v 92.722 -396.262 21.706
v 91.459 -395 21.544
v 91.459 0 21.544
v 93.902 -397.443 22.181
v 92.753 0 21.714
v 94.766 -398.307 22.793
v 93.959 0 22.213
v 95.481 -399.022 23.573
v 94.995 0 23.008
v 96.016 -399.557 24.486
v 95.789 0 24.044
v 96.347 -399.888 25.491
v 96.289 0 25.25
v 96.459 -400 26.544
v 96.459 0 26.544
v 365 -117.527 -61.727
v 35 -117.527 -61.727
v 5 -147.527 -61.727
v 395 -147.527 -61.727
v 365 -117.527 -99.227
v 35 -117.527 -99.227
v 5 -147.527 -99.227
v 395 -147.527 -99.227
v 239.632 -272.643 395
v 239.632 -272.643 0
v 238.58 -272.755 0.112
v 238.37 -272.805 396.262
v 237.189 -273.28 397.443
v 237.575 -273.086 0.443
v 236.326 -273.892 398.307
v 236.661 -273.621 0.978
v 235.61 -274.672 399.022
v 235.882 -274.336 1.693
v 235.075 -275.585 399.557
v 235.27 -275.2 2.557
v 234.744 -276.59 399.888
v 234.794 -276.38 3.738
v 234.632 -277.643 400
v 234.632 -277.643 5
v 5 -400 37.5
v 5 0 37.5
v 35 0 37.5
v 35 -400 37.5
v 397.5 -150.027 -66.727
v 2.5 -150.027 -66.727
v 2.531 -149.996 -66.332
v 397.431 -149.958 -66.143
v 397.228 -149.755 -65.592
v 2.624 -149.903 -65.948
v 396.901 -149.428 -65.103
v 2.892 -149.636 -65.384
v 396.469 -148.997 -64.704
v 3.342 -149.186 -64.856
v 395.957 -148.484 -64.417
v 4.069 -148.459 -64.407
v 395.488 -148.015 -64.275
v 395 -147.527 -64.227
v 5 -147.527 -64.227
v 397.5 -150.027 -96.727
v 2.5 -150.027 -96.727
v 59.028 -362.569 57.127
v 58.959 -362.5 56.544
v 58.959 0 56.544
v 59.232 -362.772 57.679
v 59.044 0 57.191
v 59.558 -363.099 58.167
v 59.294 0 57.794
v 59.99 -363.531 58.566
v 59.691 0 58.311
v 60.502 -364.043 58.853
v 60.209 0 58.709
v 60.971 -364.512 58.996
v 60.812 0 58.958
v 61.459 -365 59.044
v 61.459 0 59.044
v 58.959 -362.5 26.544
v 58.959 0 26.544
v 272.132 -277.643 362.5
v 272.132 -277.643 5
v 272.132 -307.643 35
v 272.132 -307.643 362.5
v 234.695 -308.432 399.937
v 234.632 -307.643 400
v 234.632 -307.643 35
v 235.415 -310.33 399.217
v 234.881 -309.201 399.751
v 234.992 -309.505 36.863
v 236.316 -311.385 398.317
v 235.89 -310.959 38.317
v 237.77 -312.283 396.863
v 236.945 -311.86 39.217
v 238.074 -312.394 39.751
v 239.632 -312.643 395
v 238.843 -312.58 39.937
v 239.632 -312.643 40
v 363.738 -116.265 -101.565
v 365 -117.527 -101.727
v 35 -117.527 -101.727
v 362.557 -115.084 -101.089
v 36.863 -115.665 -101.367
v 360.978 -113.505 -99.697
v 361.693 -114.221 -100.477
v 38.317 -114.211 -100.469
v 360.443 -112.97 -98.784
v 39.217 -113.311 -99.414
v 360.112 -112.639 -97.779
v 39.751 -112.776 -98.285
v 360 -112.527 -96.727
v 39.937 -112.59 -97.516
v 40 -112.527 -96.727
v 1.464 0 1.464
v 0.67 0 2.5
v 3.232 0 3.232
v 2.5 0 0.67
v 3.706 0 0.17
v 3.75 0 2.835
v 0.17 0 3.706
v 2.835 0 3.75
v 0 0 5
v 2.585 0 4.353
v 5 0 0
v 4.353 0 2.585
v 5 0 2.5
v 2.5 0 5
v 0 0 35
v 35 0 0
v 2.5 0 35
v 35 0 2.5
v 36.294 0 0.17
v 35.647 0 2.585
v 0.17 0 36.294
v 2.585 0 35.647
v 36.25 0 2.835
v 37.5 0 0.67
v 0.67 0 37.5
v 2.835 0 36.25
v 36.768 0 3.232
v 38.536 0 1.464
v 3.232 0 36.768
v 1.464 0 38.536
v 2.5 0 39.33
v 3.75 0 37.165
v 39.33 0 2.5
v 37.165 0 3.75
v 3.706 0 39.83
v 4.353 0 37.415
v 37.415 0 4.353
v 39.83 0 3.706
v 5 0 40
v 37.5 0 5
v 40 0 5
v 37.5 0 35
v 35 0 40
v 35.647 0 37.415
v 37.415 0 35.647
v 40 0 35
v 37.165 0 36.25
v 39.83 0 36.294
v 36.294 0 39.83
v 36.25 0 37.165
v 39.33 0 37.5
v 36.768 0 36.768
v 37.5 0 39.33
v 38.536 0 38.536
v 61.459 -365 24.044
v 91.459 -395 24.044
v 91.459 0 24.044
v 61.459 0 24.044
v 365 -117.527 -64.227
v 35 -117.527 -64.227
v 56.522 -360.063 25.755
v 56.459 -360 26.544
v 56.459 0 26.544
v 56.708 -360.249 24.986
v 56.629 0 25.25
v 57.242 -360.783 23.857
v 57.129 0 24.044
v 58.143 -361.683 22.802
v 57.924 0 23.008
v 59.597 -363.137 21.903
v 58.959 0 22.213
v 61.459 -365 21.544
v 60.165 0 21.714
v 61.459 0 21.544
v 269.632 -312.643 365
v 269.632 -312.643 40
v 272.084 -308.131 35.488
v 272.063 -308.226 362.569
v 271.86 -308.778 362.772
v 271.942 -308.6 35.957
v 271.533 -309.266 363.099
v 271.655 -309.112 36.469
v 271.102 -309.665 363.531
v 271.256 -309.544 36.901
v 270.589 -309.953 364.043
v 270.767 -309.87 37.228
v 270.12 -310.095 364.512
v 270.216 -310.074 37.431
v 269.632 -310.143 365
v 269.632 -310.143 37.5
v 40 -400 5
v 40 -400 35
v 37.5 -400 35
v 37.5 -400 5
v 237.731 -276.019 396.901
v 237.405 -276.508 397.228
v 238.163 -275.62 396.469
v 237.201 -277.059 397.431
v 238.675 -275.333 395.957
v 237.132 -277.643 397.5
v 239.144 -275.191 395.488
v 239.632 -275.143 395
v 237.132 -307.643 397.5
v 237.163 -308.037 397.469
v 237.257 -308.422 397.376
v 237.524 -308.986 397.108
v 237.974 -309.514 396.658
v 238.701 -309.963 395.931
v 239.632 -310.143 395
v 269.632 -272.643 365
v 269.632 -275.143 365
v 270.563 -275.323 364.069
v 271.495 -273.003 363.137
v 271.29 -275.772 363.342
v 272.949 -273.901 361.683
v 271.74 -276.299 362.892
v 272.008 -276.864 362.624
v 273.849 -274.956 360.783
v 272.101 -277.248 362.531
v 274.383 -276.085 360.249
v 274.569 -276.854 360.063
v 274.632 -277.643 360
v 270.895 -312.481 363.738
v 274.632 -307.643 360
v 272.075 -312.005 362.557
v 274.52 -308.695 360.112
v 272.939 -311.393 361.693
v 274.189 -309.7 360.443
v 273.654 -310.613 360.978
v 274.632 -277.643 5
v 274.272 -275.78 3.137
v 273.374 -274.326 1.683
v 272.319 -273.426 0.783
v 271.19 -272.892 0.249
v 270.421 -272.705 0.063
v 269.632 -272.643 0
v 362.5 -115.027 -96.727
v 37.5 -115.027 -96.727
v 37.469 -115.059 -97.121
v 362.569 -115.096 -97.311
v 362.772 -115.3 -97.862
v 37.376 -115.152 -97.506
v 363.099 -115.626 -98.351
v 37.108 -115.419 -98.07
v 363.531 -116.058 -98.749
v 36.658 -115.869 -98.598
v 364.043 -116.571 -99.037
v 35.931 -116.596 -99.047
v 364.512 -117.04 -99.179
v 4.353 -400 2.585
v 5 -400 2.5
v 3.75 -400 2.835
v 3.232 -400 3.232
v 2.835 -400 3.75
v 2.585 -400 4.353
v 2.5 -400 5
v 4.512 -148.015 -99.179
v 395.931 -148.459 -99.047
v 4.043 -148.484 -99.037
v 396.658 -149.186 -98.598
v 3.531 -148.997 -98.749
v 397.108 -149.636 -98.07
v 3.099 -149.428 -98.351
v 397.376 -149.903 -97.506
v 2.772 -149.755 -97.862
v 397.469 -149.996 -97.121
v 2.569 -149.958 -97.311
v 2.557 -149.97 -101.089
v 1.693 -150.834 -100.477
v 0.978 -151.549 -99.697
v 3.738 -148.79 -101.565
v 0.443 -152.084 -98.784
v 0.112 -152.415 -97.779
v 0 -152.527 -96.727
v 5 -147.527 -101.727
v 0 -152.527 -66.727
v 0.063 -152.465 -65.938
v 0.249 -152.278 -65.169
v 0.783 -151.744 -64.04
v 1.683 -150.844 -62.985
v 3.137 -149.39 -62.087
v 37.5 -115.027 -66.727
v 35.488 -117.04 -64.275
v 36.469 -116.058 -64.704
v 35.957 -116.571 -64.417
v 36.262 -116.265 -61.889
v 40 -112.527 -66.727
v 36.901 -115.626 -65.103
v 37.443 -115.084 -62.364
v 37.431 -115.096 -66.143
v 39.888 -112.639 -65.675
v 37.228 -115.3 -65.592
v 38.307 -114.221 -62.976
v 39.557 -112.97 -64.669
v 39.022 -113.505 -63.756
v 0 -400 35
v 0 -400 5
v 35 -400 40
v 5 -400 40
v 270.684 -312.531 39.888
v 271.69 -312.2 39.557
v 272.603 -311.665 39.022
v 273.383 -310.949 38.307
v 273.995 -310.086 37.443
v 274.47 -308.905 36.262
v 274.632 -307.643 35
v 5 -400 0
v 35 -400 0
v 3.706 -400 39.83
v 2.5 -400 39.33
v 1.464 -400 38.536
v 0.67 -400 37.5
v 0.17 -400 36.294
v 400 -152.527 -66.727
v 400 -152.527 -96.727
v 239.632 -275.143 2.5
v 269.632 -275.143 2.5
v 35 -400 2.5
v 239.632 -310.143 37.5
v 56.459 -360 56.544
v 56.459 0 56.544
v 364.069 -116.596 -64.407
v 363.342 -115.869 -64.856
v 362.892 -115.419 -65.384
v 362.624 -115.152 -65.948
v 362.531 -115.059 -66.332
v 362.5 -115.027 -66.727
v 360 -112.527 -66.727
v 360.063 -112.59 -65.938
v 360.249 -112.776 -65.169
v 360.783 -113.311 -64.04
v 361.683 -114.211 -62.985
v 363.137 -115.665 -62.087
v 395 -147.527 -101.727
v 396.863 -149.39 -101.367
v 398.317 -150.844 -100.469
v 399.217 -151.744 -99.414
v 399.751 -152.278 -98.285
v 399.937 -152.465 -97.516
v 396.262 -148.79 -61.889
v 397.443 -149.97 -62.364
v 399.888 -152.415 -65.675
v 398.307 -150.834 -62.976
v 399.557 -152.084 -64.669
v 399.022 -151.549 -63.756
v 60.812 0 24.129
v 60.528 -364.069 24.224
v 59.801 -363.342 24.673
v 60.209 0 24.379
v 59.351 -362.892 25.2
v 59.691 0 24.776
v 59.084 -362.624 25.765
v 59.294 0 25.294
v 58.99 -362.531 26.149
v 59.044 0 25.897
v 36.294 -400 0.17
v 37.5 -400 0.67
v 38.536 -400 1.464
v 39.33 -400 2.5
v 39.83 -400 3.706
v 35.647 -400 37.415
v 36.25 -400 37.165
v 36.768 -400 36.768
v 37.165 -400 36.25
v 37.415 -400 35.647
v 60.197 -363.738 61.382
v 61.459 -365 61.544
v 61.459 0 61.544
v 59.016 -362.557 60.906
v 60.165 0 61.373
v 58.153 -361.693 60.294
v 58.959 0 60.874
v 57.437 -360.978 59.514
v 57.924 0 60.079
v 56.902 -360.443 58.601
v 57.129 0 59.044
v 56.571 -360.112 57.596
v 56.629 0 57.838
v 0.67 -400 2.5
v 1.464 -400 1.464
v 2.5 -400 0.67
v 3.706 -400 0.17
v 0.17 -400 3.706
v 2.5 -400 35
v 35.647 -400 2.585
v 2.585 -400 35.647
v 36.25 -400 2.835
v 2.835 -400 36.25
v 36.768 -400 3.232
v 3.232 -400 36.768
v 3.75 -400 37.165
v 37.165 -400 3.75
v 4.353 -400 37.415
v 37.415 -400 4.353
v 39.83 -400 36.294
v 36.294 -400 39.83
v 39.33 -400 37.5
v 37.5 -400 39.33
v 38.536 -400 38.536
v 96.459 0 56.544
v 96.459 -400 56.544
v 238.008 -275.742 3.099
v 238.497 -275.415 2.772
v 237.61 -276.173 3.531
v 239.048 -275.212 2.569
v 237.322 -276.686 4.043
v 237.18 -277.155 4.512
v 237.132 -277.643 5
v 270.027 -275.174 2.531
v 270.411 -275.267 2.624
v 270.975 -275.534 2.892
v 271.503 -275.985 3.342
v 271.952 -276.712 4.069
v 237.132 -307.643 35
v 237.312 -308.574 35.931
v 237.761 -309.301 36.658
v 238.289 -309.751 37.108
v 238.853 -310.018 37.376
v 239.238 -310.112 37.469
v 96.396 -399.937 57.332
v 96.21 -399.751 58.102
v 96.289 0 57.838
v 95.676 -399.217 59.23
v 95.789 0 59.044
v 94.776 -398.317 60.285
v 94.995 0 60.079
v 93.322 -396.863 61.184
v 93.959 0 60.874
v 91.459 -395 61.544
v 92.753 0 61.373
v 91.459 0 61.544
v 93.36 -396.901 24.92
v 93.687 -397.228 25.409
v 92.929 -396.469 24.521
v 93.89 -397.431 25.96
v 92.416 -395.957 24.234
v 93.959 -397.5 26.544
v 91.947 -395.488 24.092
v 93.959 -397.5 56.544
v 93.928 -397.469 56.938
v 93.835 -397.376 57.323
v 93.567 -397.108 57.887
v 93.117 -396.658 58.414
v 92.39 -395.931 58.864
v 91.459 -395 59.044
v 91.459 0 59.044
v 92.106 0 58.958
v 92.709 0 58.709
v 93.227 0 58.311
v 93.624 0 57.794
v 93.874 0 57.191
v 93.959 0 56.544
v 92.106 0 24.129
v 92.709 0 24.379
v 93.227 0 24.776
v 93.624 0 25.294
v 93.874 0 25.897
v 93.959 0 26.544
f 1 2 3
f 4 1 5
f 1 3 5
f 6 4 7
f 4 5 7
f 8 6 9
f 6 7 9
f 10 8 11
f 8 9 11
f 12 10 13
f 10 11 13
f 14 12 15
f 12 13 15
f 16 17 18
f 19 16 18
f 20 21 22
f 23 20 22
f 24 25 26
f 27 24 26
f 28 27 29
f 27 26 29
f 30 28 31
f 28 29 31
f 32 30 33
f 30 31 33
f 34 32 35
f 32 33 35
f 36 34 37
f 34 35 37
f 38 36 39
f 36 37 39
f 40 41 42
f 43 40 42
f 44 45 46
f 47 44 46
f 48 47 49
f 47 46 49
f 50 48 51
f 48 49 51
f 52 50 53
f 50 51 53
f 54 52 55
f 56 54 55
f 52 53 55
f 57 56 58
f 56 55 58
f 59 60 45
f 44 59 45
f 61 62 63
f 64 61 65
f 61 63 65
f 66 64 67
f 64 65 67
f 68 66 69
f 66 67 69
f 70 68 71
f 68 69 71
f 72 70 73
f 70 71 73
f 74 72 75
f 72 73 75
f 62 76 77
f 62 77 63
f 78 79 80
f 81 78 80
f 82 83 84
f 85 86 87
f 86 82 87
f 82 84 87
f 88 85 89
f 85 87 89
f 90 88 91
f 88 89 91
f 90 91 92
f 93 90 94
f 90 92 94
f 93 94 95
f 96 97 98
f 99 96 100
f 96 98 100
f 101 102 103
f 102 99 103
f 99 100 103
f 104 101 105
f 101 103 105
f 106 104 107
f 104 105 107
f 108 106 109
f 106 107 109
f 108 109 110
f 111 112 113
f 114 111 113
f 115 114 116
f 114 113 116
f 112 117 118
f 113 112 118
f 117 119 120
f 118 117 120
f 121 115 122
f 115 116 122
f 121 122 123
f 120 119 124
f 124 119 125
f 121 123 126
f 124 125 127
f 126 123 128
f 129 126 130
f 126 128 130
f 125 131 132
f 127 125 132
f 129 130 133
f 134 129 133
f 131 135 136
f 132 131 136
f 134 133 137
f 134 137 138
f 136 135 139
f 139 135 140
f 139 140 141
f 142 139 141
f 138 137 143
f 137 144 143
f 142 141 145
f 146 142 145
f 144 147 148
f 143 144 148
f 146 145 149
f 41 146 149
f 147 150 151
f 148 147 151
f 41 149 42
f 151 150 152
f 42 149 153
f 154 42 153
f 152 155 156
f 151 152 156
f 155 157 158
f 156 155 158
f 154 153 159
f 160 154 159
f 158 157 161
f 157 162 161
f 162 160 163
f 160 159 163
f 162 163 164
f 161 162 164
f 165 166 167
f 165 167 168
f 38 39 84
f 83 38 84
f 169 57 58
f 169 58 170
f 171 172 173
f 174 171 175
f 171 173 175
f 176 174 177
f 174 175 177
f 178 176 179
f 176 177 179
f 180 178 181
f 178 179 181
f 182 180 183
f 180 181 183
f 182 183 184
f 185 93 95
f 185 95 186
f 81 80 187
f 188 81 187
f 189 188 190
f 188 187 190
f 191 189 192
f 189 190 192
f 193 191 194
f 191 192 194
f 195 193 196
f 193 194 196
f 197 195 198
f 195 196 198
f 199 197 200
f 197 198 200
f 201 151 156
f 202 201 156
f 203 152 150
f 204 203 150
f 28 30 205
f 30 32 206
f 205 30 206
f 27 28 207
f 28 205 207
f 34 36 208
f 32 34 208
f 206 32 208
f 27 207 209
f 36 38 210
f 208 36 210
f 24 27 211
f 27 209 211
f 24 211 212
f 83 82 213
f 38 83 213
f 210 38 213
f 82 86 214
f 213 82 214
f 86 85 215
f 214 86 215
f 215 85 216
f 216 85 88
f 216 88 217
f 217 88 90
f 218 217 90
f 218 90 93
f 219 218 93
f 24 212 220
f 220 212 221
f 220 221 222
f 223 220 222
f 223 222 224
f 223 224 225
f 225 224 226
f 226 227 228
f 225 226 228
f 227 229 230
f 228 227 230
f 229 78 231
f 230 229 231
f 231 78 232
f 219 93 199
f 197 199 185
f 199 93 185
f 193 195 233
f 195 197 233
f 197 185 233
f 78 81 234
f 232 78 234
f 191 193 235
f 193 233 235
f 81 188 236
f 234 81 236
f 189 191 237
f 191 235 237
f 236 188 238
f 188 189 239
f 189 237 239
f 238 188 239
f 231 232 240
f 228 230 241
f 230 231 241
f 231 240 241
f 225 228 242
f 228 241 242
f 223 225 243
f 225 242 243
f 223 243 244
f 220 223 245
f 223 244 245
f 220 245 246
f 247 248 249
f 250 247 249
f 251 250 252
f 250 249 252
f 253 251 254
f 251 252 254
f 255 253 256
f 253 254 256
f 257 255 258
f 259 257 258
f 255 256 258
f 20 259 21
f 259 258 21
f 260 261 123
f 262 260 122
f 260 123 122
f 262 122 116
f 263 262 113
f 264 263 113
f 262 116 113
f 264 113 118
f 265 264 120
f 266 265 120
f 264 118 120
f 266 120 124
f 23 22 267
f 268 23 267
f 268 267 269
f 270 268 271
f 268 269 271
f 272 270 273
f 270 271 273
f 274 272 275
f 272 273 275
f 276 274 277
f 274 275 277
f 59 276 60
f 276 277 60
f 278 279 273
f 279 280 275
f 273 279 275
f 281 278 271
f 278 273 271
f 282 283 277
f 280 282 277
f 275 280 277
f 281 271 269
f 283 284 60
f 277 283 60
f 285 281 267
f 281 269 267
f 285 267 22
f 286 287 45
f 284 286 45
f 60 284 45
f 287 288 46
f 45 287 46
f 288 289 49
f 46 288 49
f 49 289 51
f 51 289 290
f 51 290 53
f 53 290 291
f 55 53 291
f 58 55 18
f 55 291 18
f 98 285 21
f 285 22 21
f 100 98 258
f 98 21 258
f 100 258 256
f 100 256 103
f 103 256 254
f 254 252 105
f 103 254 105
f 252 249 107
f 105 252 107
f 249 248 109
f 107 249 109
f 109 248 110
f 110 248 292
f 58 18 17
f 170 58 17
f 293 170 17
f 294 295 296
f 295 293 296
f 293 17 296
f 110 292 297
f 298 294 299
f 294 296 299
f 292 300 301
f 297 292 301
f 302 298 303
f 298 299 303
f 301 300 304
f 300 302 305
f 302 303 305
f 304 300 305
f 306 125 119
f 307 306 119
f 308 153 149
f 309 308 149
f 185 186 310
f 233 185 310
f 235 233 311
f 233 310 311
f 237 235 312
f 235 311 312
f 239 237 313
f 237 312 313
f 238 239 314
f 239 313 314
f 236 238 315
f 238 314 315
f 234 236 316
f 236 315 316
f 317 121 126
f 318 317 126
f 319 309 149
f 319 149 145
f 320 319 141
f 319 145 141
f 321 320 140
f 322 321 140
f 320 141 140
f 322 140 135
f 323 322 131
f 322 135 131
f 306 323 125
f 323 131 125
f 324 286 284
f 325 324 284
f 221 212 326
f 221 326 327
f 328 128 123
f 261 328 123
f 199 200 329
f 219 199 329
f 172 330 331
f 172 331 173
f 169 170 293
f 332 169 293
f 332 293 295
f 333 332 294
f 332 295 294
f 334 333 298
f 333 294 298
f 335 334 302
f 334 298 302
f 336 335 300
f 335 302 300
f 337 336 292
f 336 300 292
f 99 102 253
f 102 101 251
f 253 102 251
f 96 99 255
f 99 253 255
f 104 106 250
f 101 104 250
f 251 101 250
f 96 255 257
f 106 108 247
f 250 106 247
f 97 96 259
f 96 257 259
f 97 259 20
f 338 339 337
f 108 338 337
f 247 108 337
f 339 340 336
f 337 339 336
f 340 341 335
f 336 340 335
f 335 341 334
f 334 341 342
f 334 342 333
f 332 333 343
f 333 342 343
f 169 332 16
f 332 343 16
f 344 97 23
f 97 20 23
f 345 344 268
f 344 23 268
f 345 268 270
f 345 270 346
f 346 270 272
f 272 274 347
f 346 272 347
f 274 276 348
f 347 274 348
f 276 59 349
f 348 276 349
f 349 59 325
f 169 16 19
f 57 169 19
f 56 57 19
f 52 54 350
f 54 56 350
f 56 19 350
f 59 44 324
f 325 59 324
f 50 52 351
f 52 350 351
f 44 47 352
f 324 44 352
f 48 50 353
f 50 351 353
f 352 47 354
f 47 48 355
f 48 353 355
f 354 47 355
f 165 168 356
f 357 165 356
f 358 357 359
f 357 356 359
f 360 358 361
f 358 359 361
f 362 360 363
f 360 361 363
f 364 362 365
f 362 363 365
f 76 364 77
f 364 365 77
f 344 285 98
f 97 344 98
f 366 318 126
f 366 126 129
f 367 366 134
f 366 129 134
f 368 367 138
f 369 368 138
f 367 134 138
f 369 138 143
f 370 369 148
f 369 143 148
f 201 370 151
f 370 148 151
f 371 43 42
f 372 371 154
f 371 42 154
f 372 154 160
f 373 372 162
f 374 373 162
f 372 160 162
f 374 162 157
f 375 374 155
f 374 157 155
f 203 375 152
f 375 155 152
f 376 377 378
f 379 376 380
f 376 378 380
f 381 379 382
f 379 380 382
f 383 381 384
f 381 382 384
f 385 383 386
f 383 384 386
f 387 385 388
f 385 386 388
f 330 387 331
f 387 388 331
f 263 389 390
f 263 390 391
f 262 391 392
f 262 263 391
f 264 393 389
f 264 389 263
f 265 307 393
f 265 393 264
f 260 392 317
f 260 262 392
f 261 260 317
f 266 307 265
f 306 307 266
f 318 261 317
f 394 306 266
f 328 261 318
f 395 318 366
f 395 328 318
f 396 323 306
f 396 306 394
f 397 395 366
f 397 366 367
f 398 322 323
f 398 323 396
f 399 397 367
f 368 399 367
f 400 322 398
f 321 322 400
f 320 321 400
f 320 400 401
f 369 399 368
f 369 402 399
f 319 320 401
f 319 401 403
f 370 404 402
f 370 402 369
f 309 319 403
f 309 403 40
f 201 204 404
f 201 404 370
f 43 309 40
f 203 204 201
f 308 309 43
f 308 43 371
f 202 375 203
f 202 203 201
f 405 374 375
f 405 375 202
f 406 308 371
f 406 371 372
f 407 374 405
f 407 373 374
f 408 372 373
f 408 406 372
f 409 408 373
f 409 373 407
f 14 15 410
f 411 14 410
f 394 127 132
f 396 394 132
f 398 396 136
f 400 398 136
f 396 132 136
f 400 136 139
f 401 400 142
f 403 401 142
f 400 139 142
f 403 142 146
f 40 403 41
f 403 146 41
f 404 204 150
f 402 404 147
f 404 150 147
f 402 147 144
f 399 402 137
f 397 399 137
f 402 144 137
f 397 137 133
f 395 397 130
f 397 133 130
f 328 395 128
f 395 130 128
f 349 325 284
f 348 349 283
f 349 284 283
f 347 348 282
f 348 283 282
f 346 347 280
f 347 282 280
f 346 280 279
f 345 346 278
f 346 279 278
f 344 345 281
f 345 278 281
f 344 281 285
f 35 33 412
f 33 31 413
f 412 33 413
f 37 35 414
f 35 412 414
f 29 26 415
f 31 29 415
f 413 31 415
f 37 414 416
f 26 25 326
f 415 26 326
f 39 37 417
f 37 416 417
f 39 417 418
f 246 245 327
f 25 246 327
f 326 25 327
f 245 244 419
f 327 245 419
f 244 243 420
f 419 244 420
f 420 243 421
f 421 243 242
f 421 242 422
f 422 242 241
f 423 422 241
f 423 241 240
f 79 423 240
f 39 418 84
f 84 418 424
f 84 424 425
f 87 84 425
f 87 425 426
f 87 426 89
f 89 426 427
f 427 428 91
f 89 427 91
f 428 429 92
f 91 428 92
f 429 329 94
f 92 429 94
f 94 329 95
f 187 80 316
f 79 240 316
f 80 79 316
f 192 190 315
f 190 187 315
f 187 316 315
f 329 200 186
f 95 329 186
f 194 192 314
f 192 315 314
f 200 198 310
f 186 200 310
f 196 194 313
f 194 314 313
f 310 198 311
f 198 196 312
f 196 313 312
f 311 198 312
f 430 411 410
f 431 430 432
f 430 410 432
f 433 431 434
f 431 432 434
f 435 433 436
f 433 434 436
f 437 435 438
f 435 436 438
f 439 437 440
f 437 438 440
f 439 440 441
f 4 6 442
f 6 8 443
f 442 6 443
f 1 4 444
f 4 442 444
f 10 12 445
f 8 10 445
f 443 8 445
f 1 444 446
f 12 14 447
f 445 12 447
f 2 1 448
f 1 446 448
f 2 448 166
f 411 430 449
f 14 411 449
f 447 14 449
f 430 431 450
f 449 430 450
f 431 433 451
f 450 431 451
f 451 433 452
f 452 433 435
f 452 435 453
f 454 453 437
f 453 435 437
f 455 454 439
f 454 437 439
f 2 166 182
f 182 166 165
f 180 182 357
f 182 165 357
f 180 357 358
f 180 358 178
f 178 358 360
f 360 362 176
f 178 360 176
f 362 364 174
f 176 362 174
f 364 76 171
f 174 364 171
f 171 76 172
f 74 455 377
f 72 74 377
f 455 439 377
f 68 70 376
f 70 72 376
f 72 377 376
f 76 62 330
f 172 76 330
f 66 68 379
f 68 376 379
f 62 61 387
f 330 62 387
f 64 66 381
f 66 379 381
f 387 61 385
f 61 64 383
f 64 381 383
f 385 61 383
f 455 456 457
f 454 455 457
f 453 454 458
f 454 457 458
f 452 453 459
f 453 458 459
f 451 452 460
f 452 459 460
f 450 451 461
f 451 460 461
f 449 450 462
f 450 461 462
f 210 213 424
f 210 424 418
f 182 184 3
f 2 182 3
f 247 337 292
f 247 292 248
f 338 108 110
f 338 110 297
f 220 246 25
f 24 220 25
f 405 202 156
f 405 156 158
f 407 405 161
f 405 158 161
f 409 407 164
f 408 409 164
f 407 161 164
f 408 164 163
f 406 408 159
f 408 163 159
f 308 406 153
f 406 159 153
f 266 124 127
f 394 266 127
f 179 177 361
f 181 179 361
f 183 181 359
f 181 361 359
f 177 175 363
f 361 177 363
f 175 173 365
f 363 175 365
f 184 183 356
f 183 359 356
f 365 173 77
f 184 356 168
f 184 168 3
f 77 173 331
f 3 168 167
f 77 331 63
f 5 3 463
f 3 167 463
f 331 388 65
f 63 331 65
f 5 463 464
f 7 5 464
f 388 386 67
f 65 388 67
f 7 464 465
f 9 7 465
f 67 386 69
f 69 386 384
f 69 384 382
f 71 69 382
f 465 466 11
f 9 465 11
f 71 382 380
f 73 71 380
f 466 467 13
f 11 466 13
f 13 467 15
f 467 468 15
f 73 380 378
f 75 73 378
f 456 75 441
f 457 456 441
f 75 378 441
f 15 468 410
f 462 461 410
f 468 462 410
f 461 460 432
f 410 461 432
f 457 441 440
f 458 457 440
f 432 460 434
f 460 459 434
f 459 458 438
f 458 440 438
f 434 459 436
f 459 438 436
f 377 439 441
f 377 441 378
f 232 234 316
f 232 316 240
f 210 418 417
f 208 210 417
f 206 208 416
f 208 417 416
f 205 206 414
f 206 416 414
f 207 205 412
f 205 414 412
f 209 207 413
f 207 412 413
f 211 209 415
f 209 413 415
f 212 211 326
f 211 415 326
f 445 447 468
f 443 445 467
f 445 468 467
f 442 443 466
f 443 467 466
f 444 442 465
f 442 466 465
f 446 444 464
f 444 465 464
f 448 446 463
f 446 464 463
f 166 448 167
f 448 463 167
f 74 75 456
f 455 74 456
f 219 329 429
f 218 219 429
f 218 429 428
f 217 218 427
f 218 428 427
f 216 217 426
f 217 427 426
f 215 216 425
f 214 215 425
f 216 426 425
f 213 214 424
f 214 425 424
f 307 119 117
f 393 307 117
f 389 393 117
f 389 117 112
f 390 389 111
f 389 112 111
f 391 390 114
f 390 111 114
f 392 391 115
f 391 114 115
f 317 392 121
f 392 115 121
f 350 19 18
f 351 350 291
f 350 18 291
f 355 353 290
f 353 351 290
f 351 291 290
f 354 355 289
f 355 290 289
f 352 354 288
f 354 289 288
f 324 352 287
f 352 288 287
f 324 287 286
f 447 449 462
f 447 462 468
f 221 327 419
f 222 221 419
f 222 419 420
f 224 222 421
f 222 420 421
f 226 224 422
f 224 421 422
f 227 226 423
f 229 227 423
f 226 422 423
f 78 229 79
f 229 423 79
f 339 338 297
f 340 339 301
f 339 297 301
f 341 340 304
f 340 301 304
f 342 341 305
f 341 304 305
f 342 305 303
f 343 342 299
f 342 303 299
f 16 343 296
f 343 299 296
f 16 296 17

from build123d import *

# Parameters (mm, degrees)
F1_DEPTH  = 400
F3_DEPTH  = 400
F5_DEPTH  = 40
F7_DEPTH  = 40
F9_DEPTH  = 40
F11_DEPTH = 400
F13_DEPTH = 163.2715079019
F15_DEPTH = 400
F17_DEPTH = 274.6330855618
F19_DEPTH = 312.6438318024
F20_DEPTH = 400


with BuildPart() as f1:
    # F0 (on Front) → F1 (new body)
    with BuildSketch(Plane.XZ):
        with BuildLine():
            ThreePointArc((0, 5), (1.4644660941, 1.4644660941), (5, 0))
            Line((5, 0), (35, 0))
            ThreePointArc((35, 0), (38.5355339059, 1.4644660941), (40, 5))
            Line((40, 5), (40, 35))
            ThreePointArc((40, 35), (38.5355339059, 38.5355339059), (35, 40))
            Line((35, 40), (5, 40))
            ThreePointArc((5, 40), (1.4644660941, 38.5355339059), (0, 35))
            Line((0, 35), (0, 5))
        make_face()
        with BuildLine():
            Line((35, 2.5), (5, 2.5))
            ThreePointArc((5, 2.5), (3.232233047, 3.232233047), (2.5, 5))
            Line((2.5, 5), (2.5, 35))
            ThreePointArc((2.5, 35), (3.232233047, 36.767766953), (5, 37.5))
            Line((5, 37.5), (35, 37.5))
            ThreePointArc((35, 37.5), (36.767766953, 36.767766953), (37.5, 35))
            Line((37.5, 35), (37.5, 5))
            ThreePointArc((37.5, 5), (36.767766953, 3.232233047), (35, 2.5))
        make_face(mode=Mode.SUBTRACT)
    extrude(amount=F1_DEPTH)

    # F4 (on face) → F5 (cut)
    with BuildSketch(Plane.XY.offset(40)):
        Polygon((40, -400), (40, -360), (0, -400), align=None)
    extrude(amount=-F5_DEPTH, mode=Mode.SUBTRACT)

    # F6 (on face) → F7 (cut)
    with BuildSketch(Plane.YZ.offset(40)):
        Polygon((0, 40), (-40, 40), (0, 0), align=None)
    extrude(amount=-F7_DEPTH, mode=Mode.SUBTRACT)

    # F0 (on Front) → F20 (join)
    with BuildSketch(Plane.XZ):
        with BuildLine():
            ThreePointArc((0, 5), (1.4644660941, 1.4644660941), (5, 0))
            Line((5, 0), (35, 0))
            ThreePointArc((35, 0), (38.5355339059, 1.4644660941), (40, 5))
            Line((40, 5), (40, 35))
            ThreePointArc((40, 35), (38.5355339059, 38.5355339059), (35, 40))
            Line((35, 40), (5, 40))
            ThreePointArc((5, 40), (1.4644660941, 38.5355339059), (0, 35))
            Line((0, 35), (0, 5))
        make_face()
        with BuildLine():
            Line((35, 2.5), (5, 2.5))
            ThreePointArc((5, 2.5), (3.232233047, 3.232233047), (2.5, 5))
            Line((2.5, 5), (2.5, 35))
            ThreePointArc((2.5, 35), (3.232233047, 36.767766953), (5, 37.5))
            Line((5, 37.5), (35, 37.5))
            ThreePointArc((35, 37.5), (36.767766953, 36.767766953), (37.5, 35))
            Line((37.5, 35), (37.5, 5))
            ThreePointArc((37.5, 5), (36.767766953, 3.232233047), (35, 2.5))
        make_face(mode=Mode.SUBTRACT)
    extrude(amount=F20_DEPTH)


with BuildPart() as f3:
    # F2 (on Right) → F3 (new body)
    with BuildSketch(Plane.YZ):
        with BuildLine():
            ThreePointArc((-152.5273066759, -96.7268937826), (-151.0628405818, -100.2624276885), (-147.5273066759, -101.7268937826))
            Line((-147.5273066759, -101.7268937826), (-117.5273066759, -101.7268937826))
            ThreePointArc((-117.5273066759, -101.7268937826), (-113.99177277, -100.2624276885), (-112.5273066759, -96.7268937826))
            Line((-112.5273066759, -96.7268937826), (-112.5273066759, -66.7268937826))
            ThreePointArc((-112.5273066759, -66.7268937826), (-113.99177277, -63.1913598767), (-117.5273066759, -61.7268937826))
            Line((-117.5273066759, -61.7268937826), (-147.5273066759, -61.7268937826))
            ThreePointArc((-147.5273066759, -61.7268937826), (-151.0628405818, -63.1913598767), (-152.5273066759, -66.7268937826))
            Line((-152.5273066759, -66.7268937826), (-152.5273066759, -96.7268937826))
        make_face()
        with BuildLine():
            Line((-117.5273066759, -99.2268937826), (-147.5273066759, -99.2268937826))
            ThreePointArc((-147.5273066759, -99.2268937826), (-149.2950736289, -98.4946607356), (-150.0273066759, -96.7268937826))
            Line((-150.0273066759, -96.7268937826), (-150.0273066759, -66.7268937826))
            ThreePointArc((-150.0273066759, -66.7268937826), (-149.2950736289, -64.9591268296), (-147.5273066759, -64.2268937826))
            Line((-147.5273066759, -64.2268937826), (-117.5273066759, -64.2268937826))
            ThreePointArc((-117.5273066759, -64.2268937826), (-115.7595397229, -64.9591268296), (-115.0273066759, -66.7268937826))
            Line((-115.0273066759, -66.7268937826), (-115.0273066759, -96.7268937826))
            ThreePointArc((-115.0273066759, -96.7268937826), (-115.7595397229, -98.4946607356), (-117.5273066759, -99.2268937826))
        make_face(mode=Mode.SUBTRACT)
    extrude(amount=F3_DEPTH)

    # F8 (on face) → F9 (cut)
    with BuildSketch(Plane.XY.offset(-61.7268937826)):
        Polygon((40, -112.5273066759), (0, -112.5273066759), (0, -152.5273066759), align=None)
        Polygon((400, -112.5273066759), (360, -112.5273066759), (400, -152.5273066759), align=None)
    extrude(amount=-F9_DEPTH, mode=Mode.SUBTRACT)


with BuildPart() as f11:
    # F10 (on Front) → F11 (new body)
    with BuildSketch(Plane.XZ):
        with BuildLine():
            ThreePointArc((56.4591023326, 26.5436141193), (57.9235684267, 23.0080802134), (61.4591023326, 21.5436141193))
            Line((61.4591023326, 21.5436141193), (91.4591023326, 21.5436141193))
            ThreePointArc((91.4591023326, 21.5436141193), (94.9946362385, 23.0080802134), (96.4591023326, 26.5436141193))
            Line((96.4591023326, 26.5436141193), (96.4591023326, 56.5436141193))
            ThreePointArc((96.4591023326, 56.5436141193), (94.9946362385, 60.0791480252), (91.4591023326, 61.5436141193))
            Line((91.4591023326, 61.5436141193), (61.4591023326, 61.5436141193))
            ThreePointArc((61.4591023326, 61.5436141193), (57.9235684267, 60.0791480252), (56.4591023326, 56.5436141193))
            Line((56.4591023326, 56.5436141193), (56.4591023326, 26.5436141193))
        make_face()
        with BuildLine():
            Line((91.4591023326, 24.0436141193), (61.4591023326, 24.0436141193))
            ThreePointArc((61.4591023326, 24.0436141193), (59.6913353796, 24.7758471663), (58.9591023326, 26.5436141193))
            Line((58.9591023326, 26.5436141193), (58.9591023326, 56.5436141193))
            ThreePointArc((58.9591023326, 56.5436141193), (59.6913353796, 58.3113810723), (61.4591023326, 59.0436141193))
            Line((61.4591023326, 59.0436141193), (91.4591023326, 59.0436141193))
            ThreePointArc((91.4591023326, 59.0436141193), (93.2268692856, 58.3113810723), (93.9591023326, 56.5436141193))
            Line((93.9591023326, 56.5436141193), (93.9591023326, 26.5436141193))
            ThreePointArc((93.9591023326, 26.5436141193), (93.2268692856, 24.7758471663), (91.4591023326, 24.0436141193))
        make_face(mode=Mode.SUBTRACT)
    extrude(amount=F11_DEPTH)

    # F12 (on face) → F13 (cut, through all)
    with BuildSketch(Plane.XY.offset(61.5436141193)):
        Polygon((56.4591023326, -360), (56.4591023326, -400), (96.4591023326, -400), align=None)
    extrude(amount=-F13_DEPTH, mode=Mode.SUBTRACT)


with BuildPart() as f15:
    # F14 (on Top) → F15 (new body)
    with BuildSketch(Plane.XY):
        with BuildLine():
            ThreePointArc((234.6320855618, -307.6428318024), (236.0965516558, -311.1783657083), (239.6320855618, -312.6428318024))
            Line((239.6320855618, -312.6428318024), (269.6320855618, -312.6428318024))
            ThreePointArc((269.6320855618, -312.6428318024), (273.1676194677, -311.1783657083), (274.6320855618, -307.6428318024))
            Line((274.6320855618, -307.6428318024), (274.6320855618, -277.6428318024))
            ThreePointArc((274.6320855618, -277.6428318024), (273.1676194677, -274.1072978964), (269.6320855618, -272.6428318024))
            Line((269.6320855618, -272.6428318024), (239.6320855618, -272.6428318024))
            ThreePointArc((239.6320855618, -272.6428318024), (236.0965516558, -274.1072978964), (234.6320855618, -277.6428318024))
            Line((234.6320855618, -277.6428318024), (234.6320855618, -307.6428318024))
        make_face()
        with BuildLine():
            Line((269.6320855618, -310.1428318024), (239.6320855618, -310.1428318024))
            ThreePointArc((239.6320855618, -310.1428318024), (237.8643186088, -309.4105987553), (237.1320855618, -307.6428318024))
            Line((237.1320855618, -307.6428318024), (237.1320855618, -277.6428318024))
            ThreePointArc((237.1320855618, -277.6428318024), (237.8643186088, -275.8750648494), (239.6320855618, -275.1428318024))
            Line((239.6320855618, -275.1428318024), (269.6320855618, -275.1428318024))
            ThreePointArc((269.6320855618, -275.1428318024), (271.3998525147, -275.8750648494), (272.1320855618, -277.6428318024))
            Line((272.1320855618, -277.6428318024), (272.1320855618, -307.6428318024))
            ThreePointArc((272.1320855618, -307.6428318024), (271.3998525147, -309.4105987553), (269.6320855618, -310.1428318024))
        make_face(mode=Mode.SUBTRACT)
    extrude(amount=F15_DEPTH)

    # F16 (on face) → F17 (cut, through all)
    with BuildSketch(Plane.YZ.offset(274.6320855618)):
        Polygon((-312.6428318024, 40), (-312.6428318024, 0), (-272.6428318024, 0), align=None)
    extrude(amount=-F17_DEPTH, mode=Mode.SUBTRACT)

    # F18 (on face) → F19 (cut, through all)
    with BuildSketch(Plane.XZ.offset(312.6428318024)):
        Polygon((274.6320855618, 400), (234.6320855618, 400), (274.6320855618, 360), align=None)
    extrude(amount=-F19_DEPTH, mode=Mode.SUBTRACT)


solid = Compound([f1.part, f3.part, f11.part, f15.part])
